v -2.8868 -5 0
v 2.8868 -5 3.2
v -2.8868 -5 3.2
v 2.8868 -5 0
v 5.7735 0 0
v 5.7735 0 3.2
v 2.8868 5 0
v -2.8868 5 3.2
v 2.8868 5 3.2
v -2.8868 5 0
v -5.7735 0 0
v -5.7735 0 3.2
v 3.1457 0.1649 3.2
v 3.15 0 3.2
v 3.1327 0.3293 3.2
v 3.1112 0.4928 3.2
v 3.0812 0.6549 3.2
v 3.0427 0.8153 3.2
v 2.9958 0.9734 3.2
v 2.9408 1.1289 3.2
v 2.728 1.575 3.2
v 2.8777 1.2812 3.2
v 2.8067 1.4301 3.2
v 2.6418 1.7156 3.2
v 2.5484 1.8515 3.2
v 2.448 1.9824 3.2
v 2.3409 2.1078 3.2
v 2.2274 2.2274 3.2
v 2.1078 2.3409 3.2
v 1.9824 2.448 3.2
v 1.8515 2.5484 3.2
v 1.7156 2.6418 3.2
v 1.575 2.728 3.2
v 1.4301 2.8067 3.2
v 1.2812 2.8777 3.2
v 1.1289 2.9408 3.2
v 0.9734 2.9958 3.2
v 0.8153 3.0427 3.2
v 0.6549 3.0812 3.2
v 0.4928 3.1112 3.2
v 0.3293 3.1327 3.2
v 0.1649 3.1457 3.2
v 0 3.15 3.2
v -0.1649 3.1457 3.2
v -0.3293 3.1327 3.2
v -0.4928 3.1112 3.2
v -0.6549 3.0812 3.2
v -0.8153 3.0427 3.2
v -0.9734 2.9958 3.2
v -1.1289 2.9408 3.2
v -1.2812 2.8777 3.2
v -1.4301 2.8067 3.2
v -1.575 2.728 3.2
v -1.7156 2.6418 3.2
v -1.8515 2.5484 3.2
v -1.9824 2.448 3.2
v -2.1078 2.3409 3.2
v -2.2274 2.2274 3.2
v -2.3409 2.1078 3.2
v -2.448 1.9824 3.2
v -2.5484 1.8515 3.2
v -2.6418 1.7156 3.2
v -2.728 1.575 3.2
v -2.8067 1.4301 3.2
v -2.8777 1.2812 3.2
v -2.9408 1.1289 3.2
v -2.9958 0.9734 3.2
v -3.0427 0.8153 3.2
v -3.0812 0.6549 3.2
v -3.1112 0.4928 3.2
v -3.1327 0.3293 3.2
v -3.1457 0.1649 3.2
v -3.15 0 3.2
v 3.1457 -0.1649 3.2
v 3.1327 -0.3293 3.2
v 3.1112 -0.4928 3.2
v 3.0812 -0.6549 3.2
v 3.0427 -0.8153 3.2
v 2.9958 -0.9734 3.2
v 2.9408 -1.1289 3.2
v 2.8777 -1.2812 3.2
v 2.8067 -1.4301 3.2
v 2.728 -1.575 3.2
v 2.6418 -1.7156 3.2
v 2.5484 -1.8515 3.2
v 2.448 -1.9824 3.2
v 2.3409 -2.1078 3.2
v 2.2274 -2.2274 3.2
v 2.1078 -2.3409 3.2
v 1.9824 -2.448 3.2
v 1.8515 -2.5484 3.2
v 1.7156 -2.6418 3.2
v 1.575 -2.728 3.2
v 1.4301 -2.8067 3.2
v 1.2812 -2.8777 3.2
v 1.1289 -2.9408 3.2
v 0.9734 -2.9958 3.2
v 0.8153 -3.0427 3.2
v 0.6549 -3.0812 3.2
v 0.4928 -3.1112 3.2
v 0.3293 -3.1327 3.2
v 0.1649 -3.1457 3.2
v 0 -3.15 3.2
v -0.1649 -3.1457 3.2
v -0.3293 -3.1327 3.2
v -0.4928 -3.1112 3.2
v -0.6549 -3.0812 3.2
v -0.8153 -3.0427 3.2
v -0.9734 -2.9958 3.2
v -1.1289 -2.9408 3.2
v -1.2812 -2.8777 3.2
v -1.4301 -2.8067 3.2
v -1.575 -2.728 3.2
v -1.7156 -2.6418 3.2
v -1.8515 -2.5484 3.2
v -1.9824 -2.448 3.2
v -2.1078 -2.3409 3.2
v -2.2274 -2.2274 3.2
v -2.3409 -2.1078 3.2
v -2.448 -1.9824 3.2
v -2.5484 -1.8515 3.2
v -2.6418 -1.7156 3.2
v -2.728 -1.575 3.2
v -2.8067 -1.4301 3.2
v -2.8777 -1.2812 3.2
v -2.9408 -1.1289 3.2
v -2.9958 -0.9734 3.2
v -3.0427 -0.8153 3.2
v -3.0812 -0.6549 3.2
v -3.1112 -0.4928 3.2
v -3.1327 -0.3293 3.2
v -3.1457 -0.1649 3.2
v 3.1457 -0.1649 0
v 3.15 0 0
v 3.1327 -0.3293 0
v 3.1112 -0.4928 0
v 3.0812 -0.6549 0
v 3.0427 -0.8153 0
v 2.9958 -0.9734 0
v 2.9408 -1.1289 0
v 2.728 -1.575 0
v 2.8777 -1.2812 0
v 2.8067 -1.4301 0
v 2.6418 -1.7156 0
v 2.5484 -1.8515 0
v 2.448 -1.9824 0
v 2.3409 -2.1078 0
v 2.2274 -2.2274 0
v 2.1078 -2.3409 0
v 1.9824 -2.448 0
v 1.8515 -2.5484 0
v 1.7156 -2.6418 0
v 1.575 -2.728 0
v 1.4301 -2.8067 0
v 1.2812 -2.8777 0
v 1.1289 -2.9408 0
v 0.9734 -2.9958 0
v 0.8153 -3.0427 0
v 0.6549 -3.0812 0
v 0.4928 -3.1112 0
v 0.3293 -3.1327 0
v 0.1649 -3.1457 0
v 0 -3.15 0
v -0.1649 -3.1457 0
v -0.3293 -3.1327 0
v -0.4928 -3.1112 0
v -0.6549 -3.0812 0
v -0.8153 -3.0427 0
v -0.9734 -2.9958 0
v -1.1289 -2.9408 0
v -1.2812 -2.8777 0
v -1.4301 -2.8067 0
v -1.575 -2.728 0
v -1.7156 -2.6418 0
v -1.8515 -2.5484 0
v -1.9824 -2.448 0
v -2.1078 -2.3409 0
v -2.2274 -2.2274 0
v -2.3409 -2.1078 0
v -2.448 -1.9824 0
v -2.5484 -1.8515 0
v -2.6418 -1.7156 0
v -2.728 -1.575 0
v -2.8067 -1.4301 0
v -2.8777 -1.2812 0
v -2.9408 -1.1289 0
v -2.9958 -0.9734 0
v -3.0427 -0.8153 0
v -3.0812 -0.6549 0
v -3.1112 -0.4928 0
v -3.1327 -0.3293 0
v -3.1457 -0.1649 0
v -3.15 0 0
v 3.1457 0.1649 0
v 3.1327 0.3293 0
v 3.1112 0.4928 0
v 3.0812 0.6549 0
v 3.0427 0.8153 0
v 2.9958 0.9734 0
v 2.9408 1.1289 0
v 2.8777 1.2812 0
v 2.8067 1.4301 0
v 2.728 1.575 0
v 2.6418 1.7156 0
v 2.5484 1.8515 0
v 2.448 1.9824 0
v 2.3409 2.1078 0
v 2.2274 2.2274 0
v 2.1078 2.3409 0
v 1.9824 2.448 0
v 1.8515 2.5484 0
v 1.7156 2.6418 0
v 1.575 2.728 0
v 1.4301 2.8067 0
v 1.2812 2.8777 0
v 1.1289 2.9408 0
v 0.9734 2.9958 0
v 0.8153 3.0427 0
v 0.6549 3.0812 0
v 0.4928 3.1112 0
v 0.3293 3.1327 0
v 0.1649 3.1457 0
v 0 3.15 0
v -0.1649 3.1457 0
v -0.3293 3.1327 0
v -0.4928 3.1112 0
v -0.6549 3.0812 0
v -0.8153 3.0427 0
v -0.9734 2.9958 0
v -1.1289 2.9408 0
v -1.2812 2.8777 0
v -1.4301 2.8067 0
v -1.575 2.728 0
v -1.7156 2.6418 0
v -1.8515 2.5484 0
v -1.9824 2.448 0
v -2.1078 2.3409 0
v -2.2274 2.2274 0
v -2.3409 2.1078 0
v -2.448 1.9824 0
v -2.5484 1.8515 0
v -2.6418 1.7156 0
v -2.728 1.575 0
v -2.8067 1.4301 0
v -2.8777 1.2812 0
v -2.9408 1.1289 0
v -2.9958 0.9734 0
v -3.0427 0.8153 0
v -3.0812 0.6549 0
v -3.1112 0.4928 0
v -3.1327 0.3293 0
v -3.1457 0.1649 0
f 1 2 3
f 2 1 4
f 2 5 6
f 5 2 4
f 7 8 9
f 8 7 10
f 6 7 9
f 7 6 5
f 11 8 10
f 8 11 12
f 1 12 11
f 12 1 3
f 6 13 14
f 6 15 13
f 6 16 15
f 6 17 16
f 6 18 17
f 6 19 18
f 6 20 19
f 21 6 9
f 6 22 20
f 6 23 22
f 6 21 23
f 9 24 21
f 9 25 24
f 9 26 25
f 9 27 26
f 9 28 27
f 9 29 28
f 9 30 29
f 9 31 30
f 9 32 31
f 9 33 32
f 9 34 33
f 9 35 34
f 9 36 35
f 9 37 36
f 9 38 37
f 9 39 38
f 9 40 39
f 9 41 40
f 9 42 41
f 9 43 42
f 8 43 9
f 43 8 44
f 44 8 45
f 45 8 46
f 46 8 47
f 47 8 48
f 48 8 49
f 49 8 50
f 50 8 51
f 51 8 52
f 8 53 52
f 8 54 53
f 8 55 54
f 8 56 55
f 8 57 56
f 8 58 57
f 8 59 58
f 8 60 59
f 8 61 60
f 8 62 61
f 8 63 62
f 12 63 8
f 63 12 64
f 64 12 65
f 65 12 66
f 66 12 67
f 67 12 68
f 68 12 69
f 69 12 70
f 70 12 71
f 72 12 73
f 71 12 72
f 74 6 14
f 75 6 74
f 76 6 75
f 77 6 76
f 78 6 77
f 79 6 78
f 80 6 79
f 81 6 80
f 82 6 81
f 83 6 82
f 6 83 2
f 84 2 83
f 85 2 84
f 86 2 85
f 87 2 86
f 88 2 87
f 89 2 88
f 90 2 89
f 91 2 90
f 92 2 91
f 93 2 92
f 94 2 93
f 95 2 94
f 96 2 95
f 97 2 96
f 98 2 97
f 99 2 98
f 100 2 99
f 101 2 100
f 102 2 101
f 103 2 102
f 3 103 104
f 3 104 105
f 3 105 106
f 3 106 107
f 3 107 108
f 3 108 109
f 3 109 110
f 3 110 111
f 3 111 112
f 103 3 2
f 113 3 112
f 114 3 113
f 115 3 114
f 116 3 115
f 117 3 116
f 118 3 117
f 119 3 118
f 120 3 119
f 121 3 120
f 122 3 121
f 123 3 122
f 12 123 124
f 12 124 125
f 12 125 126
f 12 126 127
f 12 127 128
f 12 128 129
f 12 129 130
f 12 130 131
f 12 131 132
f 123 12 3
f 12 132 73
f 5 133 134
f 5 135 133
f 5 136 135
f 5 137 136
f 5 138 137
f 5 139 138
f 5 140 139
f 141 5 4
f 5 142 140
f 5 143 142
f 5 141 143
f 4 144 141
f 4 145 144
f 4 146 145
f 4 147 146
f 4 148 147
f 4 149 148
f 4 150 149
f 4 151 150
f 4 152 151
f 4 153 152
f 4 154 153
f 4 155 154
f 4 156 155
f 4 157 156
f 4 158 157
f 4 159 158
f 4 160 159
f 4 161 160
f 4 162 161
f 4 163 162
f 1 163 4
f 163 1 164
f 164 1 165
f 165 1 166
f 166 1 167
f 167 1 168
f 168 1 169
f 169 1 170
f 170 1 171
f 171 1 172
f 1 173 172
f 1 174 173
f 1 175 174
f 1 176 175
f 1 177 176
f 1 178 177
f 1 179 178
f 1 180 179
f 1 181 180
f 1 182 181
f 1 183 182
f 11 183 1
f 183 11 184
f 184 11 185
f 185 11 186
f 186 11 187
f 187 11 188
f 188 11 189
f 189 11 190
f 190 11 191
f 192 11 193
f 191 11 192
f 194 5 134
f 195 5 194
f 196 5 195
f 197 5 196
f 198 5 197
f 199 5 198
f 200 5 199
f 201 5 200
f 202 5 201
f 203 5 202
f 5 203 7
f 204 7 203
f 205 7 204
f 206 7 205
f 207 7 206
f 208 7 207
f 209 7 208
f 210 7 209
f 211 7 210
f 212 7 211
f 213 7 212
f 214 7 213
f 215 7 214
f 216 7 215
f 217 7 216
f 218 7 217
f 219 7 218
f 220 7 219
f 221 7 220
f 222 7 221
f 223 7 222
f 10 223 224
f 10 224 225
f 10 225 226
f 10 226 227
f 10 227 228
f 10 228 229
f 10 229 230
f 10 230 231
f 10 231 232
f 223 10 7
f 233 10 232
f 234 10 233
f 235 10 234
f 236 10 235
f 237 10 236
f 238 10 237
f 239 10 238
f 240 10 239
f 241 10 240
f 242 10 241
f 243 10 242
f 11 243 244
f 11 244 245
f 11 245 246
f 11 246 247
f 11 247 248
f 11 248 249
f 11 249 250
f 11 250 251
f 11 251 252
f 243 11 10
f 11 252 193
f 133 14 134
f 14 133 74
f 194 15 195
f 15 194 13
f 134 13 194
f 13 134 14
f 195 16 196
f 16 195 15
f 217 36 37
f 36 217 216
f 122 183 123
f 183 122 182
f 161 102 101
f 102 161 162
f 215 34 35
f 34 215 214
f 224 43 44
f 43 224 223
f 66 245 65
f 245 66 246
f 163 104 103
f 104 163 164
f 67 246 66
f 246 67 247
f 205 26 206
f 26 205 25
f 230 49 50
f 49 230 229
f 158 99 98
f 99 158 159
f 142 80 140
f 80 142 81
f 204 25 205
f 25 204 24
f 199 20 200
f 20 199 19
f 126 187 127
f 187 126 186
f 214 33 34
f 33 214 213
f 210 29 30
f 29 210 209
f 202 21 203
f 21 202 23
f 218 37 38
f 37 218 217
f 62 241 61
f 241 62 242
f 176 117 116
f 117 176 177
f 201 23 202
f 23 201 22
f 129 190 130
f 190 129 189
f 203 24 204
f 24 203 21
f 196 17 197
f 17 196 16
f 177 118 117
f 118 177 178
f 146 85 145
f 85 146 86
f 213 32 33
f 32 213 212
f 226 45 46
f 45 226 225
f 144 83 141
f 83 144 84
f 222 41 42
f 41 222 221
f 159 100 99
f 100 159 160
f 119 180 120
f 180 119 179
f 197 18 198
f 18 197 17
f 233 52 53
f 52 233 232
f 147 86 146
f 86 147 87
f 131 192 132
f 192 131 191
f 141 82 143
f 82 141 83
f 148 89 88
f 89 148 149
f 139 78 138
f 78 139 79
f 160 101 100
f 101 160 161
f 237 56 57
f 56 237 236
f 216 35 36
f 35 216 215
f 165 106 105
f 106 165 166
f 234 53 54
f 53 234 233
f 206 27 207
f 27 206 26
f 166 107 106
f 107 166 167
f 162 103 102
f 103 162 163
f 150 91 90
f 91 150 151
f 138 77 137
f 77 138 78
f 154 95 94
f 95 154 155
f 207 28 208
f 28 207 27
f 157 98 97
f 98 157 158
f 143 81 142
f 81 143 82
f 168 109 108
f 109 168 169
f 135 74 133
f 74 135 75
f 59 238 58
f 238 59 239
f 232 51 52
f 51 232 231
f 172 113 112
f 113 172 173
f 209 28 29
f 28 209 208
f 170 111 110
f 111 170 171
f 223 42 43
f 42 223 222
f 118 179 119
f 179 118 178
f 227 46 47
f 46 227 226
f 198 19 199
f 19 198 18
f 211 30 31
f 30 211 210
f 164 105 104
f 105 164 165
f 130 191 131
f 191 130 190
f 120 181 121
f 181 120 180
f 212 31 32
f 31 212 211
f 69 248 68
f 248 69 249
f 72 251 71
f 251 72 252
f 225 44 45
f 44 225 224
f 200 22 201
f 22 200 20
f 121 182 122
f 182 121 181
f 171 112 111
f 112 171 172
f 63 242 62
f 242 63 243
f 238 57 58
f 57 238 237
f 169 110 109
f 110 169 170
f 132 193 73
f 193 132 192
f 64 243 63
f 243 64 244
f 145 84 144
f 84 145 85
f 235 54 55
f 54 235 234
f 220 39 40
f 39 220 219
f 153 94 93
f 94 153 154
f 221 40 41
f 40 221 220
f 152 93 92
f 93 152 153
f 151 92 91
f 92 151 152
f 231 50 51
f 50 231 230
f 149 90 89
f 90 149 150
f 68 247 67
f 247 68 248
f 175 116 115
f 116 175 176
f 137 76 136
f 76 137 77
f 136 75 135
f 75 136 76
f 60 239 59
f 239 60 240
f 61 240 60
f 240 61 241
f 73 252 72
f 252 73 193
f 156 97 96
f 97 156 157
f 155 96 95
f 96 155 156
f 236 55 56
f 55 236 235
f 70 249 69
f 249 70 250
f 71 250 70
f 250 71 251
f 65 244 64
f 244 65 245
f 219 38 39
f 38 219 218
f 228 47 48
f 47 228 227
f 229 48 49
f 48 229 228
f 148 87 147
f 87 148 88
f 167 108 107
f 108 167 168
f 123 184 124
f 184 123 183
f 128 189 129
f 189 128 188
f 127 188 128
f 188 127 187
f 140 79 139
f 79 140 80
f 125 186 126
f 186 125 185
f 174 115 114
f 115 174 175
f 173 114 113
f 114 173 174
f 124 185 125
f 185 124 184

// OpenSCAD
$fn = 120;

across_flats = 10.0;   // mm
thickness    = 3.2;    // mm
screw_d      = 6.0;    // mm (clearance hole)

clearance = 0.3;       // mm added to screw diameter for fit

module hex_prism_af(af, h){
    // For a regular hexagon: across_flats = 2 * apothem
    // Circumradius R = apothem / cos(30°) = (af/2) / cos(30°)
    R = (af/2) / cos(30);
    cylinder(h=h, r=R, $fn=6);
}

difference() {
    hex_prism_af(across_flats, thickness);
    translate([0,0,-0.1])
        cylinder(h=thickness+0.2, d=screw_d + clearance, $fn=120);
}
